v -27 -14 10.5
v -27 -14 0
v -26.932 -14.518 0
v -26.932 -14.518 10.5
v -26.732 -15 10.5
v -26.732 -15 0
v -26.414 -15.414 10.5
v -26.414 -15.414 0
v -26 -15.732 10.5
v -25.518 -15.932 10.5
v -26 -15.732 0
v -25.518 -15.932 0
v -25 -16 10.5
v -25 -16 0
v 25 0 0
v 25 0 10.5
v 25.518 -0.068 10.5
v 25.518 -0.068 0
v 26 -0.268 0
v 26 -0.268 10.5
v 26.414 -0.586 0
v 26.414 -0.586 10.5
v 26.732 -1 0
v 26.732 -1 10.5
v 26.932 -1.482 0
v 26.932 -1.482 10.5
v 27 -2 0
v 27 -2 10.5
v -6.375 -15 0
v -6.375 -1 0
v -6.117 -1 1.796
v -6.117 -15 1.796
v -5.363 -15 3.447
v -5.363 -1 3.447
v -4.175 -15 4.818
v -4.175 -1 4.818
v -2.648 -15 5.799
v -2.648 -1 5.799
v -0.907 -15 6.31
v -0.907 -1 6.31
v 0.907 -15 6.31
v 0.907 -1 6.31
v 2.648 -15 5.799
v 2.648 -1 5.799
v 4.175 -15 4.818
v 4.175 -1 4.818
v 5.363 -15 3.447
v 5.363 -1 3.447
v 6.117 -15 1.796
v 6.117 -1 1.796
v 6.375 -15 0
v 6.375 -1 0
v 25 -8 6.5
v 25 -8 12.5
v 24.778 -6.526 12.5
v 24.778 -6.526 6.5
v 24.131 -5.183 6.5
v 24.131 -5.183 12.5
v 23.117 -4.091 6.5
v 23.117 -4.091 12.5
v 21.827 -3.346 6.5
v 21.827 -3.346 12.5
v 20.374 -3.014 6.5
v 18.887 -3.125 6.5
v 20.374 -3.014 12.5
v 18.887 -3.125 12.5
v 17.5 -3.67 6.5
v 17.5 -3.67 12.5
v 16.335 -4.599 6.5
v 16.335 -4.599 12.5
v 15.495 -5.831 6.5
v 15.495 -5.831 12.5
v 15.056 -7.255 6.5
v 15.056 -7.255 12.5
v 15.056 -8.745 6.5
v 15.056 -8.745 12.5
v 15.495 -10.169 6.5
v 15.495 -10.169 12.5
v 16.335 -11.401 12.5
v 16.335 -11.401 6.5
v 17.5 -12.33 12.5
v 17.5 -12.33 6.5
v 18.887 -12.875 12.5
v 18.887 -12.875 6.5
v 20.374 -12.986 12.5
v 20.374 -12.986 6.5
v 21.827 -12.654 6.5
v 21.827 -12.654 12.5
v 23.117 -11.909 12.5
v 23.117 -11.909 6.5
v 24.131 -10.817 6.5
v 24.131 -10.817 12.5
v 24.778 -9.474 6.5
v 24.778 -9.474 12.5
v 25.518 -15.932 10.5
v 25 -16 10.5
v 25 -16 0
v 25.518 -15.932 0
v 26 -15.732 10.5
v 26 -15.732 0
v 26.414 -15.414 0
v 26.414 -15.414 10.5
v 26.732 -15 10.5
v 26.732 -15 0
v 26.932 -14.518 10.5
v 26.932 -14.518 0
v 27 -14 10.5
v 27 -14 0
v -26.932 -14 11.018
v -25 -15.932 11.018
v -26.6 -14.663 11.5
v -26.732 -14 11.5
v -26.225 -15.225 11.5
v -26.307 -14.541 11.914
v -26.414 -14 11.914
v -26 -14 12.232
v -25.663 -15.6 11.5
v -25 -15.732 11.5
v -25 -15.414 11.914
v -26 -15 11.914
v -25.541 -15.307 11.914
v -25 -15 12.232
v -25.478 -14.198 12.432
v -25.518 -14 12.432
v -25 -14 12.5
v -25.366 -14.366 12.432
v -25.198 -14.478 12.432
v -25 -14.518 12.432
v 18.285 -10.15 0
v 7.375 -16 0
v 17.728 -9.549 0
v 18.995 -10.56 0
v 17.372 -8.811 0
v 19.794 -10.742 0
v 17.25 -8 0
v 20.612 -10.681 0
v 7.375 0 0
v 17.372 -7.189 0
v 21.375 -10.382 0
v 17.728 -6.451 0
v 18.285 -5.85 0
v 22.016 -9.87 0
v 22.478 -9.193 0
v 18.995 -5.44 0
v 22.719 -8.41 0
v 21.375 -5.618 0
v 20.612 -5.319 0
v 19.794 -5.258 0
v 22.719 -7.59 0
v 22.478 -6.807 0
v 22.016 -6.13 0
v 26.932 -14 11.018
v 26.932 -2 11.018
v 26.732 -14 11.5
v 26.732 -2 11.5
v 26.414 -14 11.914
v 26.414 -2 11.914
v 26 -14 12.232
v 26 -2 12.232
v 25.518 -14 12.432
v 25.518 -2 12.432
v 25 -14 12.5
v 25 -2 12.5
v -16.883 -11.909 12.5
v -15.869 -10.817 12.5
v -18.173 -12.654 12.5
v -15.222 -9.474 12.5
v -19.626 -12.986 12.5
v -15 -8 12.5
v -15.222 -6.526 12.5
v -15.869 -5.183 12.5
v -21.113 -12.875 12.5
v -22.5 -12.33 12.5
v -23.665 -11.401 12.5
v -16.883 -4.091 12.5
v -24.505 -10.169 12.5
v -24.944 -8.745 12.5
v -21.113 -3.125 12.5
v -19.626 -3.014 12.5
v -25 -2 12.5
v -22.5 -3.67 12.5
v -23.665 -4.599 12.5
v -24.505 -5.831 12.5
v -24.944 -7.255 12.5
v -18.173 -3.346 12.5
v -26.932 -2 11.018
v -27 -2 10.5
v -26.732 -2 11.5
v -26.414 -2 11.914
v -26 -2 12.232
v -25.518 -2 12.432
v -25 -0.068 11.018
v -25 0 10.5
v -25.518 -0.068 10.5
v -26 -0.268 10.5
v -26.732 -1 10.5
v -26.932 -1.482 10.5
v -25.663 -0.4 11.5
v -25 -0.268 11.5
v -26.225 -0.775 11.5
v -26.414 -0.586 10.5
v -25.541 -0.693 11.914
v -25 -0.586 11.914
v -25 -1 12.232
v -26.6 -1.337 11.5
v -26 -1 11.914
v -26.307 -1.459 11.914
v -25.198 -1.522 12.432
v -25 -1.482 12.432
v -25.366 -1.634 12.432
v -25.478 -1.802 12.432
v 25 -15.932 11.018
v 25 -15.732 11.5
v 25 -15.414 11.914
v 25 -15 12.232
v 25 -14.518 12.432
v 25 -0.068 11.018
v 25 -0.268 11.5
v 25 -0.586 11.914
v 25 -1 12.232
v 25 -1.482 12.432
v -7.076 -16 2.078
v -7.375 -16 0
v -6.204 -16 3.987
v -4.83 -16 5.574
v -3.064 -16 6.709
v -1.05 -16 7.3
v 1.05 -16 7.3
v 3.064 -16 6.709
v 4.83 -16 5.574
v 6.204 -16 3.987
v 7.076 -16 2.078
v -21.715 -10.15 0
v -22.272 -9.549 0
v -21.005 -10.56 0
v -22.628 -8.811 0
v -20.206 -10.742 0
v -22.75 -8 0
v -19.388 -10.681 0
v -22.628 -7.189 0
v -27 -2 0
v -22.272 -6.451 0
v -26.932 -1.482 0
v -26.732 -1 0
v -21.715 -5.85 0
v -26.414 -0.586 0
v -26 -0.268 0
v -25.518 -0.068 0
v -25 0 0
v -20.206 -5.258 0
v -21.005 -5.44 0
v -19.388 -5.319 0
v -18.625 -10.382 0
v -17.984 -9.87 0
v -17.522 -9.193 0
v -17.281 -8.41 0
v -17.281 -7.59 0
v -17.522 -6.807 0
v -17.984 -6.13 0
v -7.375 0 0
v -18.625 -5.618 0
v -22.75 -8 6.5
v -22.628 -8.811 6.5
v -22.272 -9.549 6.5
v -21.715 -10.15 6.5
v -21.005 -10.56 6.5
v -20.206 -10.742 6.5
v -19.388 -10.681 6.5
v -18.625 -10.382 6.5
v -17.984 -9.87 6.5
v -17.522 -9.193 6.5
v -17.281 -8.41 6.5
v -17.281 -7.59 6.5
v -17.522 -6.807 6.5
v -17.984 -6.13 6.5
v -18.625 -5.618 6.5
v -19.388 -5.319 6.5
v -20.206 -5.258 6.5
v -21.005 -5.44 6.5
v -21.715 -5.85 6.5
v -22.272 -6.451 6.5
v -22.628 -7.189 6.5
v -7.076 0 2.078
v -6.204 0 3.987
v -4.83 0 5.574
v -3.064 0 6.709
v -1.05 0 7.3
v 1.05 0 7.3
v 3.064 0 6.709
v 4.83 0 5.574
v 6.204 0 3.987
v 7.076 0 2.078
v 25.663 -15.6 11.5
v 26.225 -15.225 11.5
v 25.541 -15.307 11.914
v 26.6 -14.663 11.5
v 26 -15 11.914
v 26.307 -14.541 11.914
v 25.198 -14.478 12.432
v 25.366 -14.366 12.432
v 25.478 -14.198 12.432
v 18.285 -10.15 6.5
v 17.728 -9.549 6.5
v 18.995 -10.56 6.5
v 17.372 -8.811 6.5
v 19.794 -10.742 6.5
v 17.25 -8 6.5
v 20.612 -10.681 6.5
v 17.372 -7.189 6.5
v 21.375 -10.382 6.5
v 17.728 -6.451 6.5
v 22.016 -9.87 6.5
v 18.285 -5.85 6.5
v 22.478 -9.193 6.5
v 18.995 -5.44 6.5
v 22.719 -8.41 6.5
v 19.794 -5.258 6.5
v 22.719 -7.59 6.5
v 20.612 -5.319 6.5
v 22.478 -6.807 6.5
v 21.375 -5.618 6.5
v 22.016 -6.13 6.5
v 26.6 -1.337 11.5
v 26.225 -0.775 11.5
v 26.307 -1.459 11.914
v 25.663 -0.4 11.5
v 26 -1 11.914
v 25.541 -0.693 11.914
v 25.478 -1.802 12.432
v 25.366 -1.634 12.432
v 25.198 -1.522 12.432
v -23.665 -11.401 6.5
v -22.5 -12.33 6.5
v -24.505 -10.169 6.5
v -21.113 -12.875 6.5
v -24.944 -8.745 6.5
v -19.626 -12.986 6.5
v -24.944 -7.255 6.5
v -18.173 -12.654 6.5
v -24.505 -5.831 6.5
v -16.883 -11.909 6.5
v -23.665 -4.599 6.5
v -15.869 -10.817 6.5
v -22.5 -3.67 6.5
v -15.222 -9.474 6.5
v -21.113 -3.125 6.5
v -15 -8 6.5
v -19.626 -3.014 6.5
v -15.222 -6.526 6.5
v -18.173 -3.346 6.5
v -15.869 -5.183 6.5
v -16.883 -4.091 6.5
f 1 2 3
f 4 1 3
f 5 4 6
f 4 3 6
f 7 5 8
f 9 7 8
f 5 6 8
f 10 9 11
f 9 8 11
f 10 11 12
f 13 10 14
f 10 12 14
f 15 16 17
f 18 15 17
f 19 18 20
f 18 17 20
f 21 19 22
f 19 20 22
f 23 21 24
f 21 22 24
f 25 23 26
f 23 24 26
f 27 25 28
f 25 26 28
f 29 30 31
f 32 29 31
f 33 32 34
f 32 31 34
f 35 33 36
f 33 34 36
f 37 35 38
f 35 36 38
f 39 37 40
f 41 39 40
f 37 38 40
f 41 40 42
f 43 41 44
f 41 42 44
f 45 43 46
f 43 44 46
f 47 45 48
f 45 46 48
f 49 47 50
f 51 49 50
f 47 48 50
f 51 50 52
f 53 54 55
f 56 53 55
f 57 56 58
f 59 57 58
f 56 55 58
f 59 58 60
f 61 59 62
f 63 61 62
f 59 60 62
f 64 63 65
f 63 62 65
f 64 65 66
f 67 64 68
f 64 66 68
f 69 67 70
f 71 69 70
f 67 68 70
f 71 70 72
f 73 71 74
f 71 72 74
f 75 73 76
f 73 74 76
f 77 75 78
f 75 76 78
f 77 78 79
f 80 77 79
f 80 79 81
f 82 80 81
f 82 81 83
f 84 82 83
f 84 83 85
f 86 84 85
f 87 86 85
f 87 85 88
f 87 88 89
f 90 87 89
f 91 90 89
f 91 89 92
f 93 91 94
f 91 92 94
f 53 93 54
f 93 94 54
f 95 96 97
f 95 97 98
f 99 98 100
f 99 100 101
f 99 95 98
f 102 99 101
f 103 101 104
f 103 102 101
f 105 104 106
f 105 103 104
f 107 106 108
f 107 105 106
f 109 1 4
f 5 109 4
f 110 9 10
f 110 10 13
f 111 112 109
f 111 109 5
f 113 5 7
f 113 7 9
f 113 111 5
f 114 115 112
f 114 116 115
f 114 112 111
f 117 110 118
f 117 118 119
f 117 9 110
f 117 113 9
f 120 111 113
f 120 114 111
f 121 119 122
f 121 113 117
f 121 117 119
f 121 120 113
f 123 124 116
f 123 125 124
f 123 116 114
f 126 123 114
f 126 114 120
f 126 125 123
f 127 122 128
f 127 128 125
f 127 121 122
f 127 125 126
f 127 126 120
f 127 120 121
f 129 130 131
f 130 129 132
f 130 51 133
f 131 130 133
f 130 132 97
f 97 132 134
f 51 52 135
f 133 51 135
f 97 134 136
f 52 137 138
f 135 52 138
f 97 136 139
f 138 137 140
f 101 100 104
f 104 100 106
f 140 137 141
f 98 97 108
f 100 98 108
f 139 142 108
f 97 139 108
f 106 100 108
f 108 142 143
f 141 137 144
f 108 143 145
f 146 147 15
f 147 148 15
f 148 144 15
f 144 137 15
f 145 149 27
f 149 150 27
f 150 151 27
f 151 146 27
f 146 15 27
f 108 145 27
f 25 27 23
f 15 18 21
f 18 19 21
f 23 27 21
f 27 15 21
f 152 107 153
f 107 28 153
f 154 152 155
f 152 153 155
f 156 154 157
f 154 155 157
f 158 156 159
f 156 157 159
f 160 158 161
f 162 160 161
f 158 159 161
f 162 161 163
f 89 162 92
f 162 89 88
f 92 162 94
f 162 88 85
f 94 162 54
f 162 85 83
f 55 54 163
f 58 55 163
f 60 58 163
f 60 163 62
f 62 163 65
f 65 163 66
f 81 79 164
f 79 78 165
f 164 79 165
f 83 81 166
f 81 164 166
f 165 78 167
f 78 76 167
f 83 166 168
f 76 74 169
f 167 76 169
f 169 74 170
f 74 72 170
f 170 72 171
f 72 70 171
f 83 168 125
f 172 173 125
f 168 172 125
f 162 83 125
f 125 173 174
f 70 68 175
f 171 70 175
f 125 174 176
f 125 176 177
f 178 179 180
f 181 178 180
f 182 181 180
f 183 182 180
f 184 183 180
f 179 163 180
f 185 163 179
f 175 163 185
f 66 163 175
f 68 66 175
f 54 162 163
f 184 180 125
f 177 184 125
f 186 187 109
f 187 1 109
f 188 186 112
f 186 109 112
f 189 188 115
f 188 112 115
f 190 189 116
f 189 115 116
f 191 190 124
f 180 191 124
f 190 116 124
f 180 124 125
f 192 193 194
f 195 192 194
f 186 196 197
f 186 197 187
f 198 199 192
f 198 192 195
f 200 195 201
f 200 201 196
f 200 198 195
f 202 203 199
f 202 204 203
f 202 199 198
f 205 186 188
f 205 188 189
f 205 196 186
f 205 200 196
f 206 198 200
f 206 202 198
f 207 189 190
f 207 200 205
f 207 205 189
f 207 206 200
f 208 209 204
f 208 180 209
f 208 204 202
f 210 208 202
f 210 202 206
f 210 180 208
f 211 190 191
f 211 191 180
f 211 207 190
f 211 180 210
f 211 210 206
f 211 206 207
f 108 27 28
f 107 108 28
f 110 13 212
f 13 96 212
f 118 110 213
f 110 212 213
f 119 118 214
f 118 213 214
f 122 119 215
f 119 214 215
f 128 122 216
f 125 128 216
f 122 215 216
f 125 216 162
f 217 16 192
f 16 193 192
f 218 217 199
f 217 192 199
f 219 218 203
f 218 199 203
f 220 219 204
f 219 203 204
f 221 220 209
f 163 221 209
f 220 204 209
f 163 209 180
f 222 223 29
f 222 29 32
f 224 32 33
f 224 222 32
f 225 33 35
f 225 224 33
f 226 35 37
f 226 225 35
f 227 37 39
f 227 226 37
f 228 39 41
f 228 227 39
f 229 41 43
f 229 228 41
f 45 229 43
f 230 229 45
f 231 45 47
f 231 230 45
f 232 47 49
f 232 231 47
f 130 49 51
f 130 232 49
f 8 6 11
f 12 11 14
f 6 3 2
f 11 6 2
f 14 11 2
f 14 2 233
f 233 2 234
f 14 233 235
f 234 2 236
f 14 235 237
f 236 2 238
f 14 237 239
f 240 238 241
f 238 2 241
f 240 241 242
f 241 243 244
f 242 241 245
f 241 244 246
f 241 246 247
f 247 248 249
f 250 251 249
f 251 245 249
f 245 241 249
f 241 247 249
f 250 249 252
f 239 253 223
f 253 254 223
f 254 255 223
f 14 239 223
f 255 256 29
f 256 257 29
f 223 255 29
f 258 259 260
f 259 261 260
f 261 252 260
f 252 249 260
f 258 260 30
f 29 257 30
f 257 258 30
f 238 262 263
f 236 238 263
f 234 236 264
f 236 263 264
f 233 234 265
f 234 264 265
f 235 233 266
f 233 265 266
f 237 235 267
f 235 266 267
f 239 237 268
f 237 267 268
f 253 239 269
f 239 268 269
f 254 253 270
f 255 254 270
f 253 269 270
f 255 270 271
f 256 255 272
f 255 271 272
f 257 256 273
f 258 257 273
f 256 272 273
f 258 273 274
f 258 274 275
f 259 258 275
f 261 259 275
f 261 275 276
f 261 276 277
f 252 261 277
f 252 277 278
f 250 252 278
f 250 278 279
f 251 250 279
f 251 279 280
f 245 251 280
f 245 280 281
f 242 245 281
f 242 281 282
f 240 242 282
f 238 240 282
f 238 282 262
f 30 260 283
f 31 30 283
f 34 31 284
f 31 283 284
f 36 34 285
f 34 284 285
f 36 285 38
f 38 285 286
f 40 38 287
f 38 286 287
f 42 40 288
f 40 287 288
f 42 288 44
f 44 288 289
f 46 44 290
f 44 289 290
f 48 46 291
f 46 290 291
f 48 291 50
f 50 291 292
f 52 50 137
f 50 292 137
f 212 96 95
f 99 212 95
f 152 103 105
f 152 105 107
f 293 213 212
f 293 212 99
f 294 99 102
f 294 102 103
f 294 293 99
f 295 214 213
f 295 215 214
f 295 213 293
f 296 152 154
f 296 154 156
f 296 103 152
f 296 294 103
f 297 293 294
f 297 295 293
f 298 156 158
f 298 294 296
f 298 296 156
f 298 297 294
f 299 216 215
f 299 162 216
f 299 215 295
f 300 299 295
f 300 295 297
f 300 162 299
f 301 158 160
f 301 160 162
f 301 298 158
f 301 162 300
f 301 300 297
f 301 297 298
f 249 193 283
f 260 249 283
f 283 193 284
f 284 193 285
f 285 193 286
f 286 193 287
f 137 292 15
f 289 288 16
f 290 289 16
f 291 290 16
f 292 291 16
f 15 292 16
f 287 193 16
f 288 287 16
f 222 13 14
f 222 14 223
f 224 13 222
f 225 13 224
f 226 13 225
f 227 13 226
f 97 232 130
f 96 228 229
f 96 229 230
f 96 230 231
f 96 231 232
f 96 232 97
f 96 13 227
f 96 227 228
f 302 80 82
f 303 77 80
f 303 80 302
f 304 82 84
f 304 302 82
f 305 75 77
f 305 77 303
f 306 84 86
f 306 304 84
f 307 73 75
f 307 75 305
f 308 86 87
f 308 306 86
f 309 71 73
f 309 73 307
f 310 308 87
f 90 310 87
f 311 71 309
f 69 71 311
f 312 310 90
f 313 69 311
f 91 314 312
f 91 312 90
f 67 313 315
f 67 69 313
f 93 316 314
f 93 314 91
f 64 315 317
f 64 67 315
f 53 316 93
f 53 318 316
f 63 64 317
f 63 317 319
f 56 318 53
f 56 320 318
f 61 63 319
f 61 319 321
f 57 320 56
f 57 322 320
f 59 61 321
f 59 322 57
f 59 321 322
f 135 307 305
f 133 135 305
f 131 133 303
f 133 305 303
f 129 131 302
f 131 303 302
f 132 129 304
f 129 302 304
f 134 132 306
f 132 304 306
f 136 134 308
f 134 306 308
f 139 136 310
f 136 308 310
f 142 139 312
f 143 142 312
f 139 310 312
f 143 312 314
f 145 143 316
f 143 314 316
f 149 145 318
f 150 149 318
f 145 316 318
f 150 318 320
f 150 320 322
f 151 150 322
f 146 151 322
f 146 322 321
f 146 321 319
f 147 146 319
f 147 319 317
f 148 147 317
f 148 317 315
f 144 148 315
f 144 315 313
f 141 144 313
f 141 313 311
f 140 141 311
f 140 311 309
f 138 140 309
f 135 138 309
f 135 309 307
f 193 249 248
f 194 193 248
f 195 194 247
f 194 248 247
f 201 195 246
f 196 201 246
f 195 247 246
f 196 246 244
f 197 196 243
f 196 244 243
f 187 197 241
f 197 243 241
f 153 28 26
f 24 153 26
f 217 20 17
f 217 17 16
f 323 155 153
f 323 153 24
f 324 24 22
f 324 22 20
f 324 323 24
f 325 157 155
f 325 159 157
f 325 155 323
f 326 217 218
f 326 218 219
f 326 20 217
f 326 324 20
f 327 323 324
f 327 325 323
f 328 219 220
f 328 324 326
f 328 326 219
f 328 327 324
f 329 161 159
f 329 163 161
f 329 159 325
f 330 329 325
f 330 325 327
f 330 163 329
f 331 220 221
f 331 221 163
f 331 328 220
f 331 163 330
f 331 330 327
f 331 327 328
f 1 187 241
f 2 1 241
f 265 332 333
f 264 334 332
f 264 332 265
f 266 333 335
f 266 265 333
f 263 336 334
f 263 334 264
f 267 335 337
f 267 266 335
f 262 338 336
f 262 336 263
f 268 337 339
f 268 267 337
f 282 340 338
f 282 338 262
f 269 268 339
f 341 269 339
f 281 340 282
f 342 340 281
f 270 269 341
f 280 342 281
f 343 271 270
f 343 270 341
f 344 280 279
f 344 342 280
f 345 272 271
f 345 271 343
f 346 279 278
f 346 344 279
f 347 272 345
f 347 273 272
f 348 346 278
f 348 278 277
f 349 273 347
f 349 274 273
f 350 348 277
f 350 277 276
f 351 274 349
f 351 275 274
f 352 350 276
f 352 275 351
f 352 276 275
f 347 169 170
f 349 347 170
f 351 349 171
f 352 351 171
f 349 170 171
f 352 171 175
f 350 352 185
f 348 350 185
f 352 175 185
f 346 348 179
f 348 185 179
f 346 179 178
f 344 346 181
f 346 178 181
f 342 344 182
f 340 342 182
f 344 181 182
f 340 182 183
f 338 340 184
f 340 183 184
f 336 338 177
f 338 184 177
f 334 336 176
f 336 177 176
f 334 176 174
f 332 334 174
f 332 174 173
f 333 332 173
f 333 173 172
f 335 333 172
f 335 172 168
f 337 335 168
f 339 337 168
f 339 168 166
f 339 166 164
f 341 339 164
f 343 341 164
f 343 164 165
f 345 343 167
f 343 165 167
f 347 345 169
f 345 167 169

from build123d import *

# Parameters (mm, degrees)
F1_DEPTH = 16
F3_DEPTH = 12.501
F4_R     = 5
F4_R_2   = 2.75
F5_DEPTH = 6
F6_SIZE  = 1
F7_R     = 2
F8_R     = 1.99999


# Not quite as in the source:
# - a fillet or chamfer is up to 0.001 mm smaller than in the source, because OpenCascade refuses the exact size


with BuildPart() as f1:
    # F0 (on Front) → F1 (new body)
    with BuildSketch(Plane.XZ):
        with BuildLine():
            Line((27, 12.5), (-27, 12.5))
            Line((-27, 12.5), (-27, 0))
            Line((-27, 0), (-6.375, 0))
            ThreePointArc((-6.375, 0), (0, 6.375), (6.375, 0))
            Line((6.375, 0), (27, 0))
            Line((27, 0), (27, 12.5))
        make_face()
    extrude(amount=F1_DEPTH)

    # F2 (on face) → F3 (cut, through all)
    with BuildSketch(Plane.XY.offset(12.5)):
        with BuildLine():
            Line((-22.75, -8), (-17.25, -8))
            ThreePointArc((-17.25, -8), (-20, -5.25), (-22.75, -8))
        make_face()
        with BuildLine():
            ThreePointArc((-22.75, -8), (-20, -10.75), (-17.25, -8))
            Line((-17.25, -8), (-22.75, -8))
        make_face()
        with BuildLine():
            Line((17.25, -8), (22.75, -8))
            ThreePointArc((22.75, -8), (20, -5.25), (17.25, -8))
        make_face()
        with BuildLine():
            ThreePointArc((17.25, -8), (20, -10.75), (22.75, -8))
            Line((22.75, -8), (17.25, -8))
        make_face()
    extrude(amount=-F3_DEPTH, mode=Mode.SUBTRACT)

    # F4 (on face) → F5 (cut)
    with BuildSketch(Plane.XY.offset(12.5)):
        with Locations((-20, -8)):
            Circle(F4_R)
        with Locations((-20, -8)):
            Circle(F4_R_2, mode=Mode.SUBTRACT)
        with Locations((20, -8)):
            Circle(F4_R)
        with Locations((20, -8)):
            Circle(F4_R_2, mode=Mode.SUBTRACT)
    extrude(amount=-F5_DEPTH, mode=Mode.SUBTRACT)

    # F6
    f6_edges = [f1.edges().sort_by_distance(p)[0] for p in [
        (0, -16, 6.375),
        (0, 0, 6.375),
    ]]
    chamfer(f6_edges, length=F6_SIZE)

    # F7
    f7_edges = [f1.edges().sort_by_distance(p)[0] for p in [
        (27, 0, 6.25),
        (27, -16, 6.25),
        (-27, 0, 6.25),
        (-27, -16, 6.25),
    ]]
    fillet(f7_edges, radius=F7_R)

    # F8 (radius 2 in the source; OpenCascade refuses exactly that, so slightly less here)
    f8_edges = [f1.edges().sort_by_distance(p)[0] for p in [
        (0, 0, 12.5),
    ]]
    fillet(f8_edges, radius=F8_R)


solid = f1.part
